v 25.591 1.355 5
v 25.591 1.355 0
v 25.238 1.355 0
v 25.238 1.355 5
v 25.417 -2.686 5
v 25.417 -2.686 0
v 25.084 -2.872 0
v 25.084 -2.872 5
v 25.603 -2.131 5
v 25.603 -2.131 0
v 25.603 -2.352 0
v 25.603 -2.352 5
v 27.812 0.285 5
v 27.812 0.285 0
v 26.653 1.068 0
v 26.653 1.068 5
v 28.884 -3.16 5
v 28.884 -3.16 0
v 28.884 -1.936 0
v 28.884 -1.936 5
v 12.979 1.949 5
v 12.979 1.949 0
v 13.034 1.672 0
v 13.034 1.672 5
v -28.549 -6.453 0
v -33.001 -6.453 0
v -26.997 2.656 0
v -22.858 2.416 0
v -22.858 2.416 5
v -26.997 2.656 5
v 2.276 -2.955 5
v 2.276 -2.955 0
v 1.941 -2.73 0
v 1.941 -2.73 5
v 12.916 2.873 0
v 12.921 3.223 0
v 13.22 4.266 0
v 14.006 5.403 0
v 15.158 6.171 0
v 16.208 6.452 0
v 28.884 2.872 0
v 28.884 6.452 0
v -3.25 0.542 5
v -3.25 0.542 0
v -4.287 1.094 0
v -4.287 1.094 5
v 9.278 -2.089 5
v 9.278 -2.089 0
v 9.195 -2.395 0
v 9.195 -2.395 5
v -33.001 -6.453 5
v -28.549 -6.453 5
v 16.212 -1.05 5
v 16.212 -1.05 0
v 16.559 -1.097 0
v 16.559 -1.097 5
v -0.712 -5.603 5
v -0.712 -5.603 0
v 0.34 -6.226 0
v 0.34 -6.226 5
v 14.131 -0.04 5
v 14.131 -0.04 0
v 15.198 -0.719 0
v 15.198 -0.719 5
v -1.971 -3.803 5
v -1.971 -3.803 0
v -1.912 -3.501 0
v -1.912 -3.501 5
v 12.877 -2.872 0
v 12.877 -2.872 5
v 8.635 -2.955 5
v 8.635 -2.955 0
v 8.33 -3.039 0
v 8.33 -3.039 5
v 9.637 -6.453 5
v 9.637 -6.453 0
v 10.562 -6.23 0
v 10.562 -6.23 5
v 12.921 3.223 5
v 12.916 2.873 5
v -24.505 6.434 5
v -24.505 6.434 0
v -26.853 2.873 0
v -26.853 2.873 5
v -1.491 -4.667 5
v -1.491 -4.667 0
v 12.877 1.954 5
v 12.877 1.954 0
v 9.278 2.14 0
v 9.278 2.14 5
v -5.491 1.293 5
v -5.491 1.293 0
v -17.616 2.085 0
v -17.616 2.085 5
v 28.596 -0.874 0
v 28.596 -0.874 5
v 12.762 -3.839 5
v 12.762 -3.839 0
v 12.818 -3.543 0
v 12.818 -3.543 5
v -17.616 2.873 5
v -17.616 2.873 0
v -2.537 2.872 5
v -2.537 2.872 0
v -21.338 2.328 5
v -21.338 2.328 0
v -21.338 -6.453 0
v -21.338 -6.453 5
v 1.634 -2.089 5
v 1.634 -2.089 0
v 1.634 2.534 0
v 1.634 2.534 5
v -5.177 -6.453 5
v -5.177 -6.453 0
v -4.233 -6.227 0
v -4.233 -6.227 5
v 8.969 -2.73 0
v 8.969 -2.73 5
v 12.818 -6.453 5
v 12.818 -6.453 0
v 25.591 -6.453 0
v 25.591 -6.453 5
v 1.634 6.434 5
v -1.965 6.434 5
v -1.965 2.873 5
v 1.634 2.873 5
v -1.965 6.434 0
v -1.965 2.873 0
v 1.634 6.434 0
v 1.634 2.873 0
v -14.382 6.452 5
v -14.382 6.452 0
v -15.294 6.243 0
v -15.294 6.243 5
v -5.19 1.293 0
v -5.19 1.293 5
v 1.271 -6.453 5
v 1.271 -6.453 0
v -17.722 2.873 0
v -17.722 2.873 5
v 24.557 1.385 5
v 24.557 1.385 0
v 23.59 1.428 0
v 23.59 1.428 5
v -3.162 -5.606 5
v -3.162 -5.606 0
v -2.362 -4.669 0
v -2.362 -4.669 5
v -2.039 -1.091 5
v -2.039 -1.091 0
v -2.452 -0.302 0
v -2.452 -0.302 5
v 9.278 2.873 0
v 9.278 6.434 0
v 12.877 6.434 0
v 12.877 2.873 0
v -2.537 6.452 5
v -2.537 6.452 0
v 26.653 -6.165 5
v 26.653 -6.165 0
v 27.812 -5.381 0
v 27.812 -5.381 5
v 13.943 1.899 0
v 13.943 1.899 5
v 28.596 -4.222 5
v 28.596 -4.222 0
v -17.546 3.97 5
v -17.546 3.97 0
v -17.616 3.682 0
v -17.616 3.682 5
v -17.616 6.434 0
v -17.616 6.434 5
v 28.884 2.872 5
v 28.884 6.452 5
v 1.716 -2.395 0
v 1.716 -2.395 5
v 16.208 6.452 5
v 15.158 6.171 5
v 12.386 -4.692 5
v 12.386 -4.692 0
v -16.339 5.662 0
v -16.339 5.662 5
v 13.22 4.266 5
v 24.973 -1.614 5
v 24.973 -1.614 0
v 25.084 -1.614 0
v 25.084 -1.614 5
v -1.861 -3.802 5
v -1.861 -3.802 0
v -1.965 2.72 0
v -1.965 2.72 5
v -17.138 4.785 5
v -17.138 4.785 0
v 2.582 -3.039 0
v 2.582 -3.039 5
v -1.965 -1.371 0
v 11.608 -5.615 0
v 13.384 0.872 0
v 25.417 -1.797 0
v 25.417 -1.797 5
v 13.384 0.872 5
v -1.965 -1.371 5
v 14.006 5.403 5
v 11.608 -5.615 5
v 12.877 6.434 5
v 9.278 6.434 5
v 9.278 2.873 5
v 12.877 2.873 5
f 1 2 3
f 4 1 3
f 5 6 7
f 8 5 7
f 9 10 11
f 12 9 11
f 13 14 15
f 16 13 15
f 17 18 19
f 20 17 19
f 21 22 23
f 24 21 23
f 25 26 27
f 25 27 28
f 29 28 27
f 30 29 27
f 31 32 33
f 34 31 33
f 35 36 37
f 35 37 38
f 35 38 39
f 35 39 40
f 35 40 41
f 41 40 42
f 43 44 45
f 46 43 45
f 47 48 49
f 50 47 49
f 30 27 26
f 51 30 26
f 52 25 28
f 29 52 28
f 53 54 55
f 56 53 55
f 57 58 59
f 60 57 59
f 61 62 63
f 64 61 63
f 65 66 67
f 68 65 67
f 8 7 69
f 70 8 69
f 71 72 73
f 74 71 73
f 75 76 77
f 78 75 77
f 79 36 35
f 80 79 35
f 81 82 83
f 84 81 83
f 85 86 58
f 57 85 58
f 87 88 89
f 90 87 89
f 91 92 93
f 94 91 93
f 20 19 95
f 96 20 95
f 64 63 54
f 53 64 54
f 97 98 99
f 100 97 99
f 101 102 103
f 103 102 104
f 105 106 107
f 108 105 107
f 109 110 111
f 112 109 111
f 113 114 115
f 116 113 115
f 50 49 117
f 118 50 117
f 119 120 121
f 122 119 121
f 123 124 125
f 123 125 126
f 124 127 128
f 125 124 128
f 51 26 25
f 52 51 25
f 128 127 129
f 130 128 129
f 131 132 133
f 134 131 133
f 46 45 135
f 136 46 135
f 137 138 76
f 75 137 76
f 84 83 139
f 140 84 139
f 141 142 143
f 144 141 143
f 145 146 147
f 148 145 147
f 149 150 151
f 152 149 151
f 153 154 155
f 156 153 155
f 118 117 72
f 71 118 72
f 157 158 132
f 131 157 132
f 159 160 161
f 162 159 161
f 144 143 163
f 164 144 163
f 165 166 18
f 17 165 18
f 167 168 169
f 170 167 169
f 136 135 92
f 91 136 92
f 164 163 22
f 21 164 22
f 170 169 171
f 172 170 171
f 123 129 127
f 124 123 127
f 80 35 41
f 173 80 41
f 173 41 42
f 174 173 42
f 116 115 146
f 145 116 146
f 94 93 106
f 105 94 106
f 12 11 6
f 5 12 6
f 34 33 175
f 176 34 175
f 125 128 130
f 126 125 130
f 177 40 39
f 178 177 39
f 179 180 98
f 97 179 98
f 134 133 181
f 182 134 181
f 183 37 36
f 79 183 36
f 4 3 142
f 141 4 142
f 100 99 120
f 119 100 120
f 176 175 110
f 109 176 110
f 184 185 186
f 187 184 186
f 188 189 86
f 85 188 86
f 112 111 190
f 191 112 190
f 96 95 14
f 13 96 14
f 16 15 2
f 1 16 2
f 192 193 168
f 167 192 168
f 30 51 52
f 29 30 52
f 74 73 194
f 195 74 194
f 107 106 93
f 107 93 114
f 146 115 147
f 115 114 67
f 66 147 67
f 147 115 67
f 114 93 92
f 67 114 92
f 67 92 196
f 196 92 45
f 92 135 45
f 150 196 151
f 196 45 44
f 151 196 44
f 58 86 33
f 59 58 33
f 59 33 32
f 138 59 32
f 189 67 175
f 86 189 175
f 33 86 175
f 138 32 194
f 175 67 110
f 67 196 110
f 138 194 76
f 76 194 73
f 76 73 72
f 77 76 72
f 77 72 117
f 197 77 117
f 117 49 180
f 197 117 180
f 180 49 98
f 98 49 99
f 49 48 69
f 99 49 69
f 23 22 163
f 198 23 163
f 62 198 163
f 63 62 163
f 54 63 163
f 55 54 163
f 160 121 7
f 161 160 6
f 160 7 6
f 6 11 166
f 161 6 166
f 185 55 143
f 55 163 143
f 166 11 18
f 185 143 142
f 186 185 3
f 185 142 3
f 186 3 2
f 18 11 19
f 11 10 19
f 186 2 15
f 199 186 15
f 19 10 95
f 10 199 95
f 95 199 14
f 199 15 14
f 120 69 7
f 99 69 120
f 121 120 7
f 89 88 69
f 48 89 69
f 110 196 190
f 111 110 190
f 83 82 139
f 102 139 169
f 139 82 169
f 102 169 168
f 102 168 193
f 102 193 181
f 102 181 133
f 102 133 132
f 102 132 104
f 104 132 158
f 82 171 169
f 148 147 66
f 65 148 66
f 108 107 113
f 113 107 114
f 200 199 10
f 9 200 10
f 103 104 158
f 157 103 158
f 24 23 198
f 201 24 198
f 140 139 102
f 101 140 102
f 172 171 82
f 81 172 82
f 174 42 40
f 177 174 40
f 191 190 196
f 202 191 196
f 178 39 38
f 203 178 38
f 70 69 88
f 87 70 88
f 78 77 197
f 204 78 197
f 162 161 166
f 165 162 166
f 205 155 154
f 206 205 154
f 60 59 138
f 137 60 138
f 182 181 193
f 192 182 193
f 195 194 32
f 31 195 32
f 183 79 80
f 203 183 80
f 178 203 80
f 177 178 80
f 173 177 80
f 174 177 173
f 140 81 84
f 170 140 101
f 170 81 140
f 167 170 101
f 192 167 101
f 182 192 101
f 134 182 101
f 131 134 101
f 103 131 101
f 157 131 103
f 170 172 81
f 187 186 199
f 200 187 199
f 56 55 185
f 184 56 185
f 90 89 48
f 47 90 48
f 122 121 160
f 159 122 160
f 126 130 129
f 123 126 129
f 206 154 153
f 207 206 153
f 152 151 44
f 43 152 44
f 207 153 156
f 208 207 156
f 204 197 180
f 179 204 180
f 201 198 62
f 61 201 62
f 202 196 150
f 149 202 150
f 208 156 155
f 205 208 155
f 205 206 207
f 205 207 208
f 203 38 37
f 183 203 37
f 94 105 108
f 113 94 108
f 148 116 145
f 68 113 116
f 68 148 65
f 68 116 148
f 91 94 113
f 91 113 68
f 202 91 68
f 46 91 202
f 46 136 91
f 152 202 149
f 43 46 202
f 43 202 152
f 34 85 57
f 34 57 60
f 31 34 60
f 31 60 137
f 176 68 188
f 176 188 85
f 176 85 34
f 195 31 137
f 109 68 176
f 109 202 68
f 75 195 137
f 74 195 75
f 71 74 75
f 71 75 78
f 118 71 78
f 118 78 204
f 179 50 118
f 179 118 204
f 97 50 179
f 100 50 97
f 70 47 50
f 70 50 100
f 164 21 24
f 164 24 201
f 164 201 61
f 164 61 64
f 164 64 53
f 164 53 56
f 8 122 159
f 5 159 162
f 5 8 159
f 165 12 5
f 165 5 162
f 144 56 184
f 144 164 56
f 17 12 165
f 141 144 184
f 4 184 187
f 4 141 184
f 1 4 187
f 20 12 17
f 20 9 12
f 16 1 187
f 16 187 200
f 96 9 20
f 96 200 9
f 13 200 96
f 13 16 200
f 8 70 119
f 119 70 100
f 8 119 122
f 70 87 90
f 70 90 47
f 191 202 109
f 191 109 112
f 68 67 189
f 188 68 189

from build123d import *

# Parameters (mm, degrees)
F1_DEPTH = 5


# Not quite as in the source:
# - the program builds the solid bodies; features that only make, move or delete a surface that nothing else refers to are left out


with BuildPart() as f1:
    # F0 (on Top) → F1 (new body)
    with BuildSketch(Plane.XY):
        Polygon((1.633601, 6.434328), (1.582547, 6.434328), (-1.964563, 6.434328), (-1.964563, 2.873248), (1.633601, 2.873248), align=None)
    extrude(amount=F1_DEPTH)


with BuildPart() as f1b:
    # F0 (on Top) → F1, piece 2 (new body)
    with BuildSketch(Plane.XY):
        Polygon((-28.549473, -6.453378), (-22.858349, 2.415794), (-26.996771, 2.65557), (-33.000569, -6.453378), align=None)
    extrude(amount=F1_DEPTH)


with BuildPart() as f1c:
    # F0 (on Top) → F1, piece 3 (new body)
    with BuildSketch(Plane.XY):
        Polygon((12.915519, 2.873248), (28.884499, 2.871978), (28.884499, 6.451854), (16.559149, 6.451854), (16.207613, 6.451854), (15.157577, 6.171184), (14.005687, 5.403342), (13.220065, 4.266438), (12.921107, 3.22326), align=None)
    extrude(amount=F1_DEPTH)


with BuildPart() as f1d:
    # F0 (on Top) → F1, piece 4 (new body)
    with BuildSketch(Plane.XY):
        Polygon((9.277731, 6.434328), (9.277731, 2.873248), (12.877165, 2.873248), (12.877165, 6.434328), (9.329801, 6.434328), align=None)
    extrude(amount=F1_DEPTH)


with BuildPart() as f1e:
    # F0 (on Top) → F1, piece 5 (new body)
    with BuildSketch(Plane.XY):
        Polygon((12.877165, -2.871724), (12.817729, -3.543046), (12.817729, -6.453378), (25.238075, -6.453378), (25.590881, -6.453378), (26.653109, -6.165088), (27.812365, -5.381244), (28.596209, -4.221988), (28.884499, -3.15976), (28.884499, -2.807208), (28.884499, -2.290318), (28.884499, -1.935988), (28.596209, -0.873506), (27.812365, 0.285242), (26.653109, 1.06807), (25.590881, 1.354582), (25.238075, 1.354582), (24.557101, 1.385062), (23.589869, 1.427734), (13.943457, 1.898904), (12.979019, 1.948688), (13.034137, 1.671828), (13.384149, 0.87249), (14.130909, -0.039878), (15.197709, -0.719328), (16.211931, -1.050036), (16.559149, -1.096772), (24.973407, -1.613662), (25.083643, -1.613662), (25.417399, -1.796796), (25.603073, -2.130552), (25.603073, -2.242058), (25.603073, -2.352294), (25.417399, -2.685796), (25.083643, -2.871724), (24.973407, -2.871724), align=None)
        Polygon((-17.616297, -2.871978), (-17.616297, -2.871724), (-17.616297, 1.7653), (-17.616297, 2.08455006), (-21.338413, 2.327656), (-21.338413, -6.453378), (-17.912715, -6.453378), (-17.616297, -6.453378), align=None)
        Polygon((-1.964563, 2.72034), (-1.964563, -1.370838), (-1.911985, -3.50139), (-1.861185, -3.801872), (-1.490599, -4.66725), (-0.711835, -5.602986), (0.339725, -6.225794), (1.271143, -6.453378), (1.582547, -6.453378), (9.329801, -6.453378), (9.637141, -6.453378), (10.561701, -6.230112), (11.607927, -5.615432), (12.386437, -4.691888), (12.762357, -3.838956), (12.817729, -3.543046), (12.877165, -2.871724), (12.877165, 1.954022), (9.277731, 2.140204), (9.277731, -1.986788), (9.277731, -2.08915), (9.194927, -2.394966), (8.969121, -2.729738), (8.635365, -2.954528), (8.329549, -3.038602), (8.227441, -3.038602), (2.683637, -3.038602), (2.581529, -3.038602), (2.275713, -2.954528), (1.940941, -2.729738), (1.716151, -2.394966), (1.633601, -2.08915), (1.633601, -1.986788), (1.633601, 2.534412), align=None)
        Polygon((-17.616297, 1.7653), (-17.616297, -2.871724), (-17.616297, -2.871978), (-17.616297, -6.453378), (-5.491099, -6.453378), (-5.176647, -6.453378), (-4.232529, -6.227318), (-3.161919, -5.60578), (-2.361565, -4.668774), (-1.971421, -3.803396), (-1.911985, -3.50139), (-1.964563, -1.370838), (-2.038985, -1.091184), (-2.452243, -0.301752), (-3.250057, 0.541528), (-4.286631, 1.094232), (-5.190363, 1.292606), (-5.491099, 1.292606), (-17.616297, 2.08455006), align=None)
    extrude(amount=F1_DEPTH)


with BuildPart() as f1f:
    # F0 (on Top) → F1, piece 6 (new body)
    with BuildSketch(Plane.XY):
        Polygon((-17.616297, 2.8732391208), (-2.536571, 2.871978), (-2.536571, 6.451854), (-14.077569, 6.451854), (-14.382115, 6.451854), (-15.294229, 6.242812), (-16.338931, 5.662422), (-17.138015, 4.784598), (-17.546193, 3.97002), (-17.616297, 3.682238), align=None)
        Polygon((-17.722469, 2.873248), (-17.616297, 2.8732391208), (-17.616297, 3.682238), (-17.616297, 6.434328), (-24.505031, 6.434328), (-26.853007, 2.873248), align=None)
    extrude(amount=F1_DEPTH)


solid = Compound([f1.part, f1b.part, f1c.part, f1d.part, f1e.part, f1f.part])
